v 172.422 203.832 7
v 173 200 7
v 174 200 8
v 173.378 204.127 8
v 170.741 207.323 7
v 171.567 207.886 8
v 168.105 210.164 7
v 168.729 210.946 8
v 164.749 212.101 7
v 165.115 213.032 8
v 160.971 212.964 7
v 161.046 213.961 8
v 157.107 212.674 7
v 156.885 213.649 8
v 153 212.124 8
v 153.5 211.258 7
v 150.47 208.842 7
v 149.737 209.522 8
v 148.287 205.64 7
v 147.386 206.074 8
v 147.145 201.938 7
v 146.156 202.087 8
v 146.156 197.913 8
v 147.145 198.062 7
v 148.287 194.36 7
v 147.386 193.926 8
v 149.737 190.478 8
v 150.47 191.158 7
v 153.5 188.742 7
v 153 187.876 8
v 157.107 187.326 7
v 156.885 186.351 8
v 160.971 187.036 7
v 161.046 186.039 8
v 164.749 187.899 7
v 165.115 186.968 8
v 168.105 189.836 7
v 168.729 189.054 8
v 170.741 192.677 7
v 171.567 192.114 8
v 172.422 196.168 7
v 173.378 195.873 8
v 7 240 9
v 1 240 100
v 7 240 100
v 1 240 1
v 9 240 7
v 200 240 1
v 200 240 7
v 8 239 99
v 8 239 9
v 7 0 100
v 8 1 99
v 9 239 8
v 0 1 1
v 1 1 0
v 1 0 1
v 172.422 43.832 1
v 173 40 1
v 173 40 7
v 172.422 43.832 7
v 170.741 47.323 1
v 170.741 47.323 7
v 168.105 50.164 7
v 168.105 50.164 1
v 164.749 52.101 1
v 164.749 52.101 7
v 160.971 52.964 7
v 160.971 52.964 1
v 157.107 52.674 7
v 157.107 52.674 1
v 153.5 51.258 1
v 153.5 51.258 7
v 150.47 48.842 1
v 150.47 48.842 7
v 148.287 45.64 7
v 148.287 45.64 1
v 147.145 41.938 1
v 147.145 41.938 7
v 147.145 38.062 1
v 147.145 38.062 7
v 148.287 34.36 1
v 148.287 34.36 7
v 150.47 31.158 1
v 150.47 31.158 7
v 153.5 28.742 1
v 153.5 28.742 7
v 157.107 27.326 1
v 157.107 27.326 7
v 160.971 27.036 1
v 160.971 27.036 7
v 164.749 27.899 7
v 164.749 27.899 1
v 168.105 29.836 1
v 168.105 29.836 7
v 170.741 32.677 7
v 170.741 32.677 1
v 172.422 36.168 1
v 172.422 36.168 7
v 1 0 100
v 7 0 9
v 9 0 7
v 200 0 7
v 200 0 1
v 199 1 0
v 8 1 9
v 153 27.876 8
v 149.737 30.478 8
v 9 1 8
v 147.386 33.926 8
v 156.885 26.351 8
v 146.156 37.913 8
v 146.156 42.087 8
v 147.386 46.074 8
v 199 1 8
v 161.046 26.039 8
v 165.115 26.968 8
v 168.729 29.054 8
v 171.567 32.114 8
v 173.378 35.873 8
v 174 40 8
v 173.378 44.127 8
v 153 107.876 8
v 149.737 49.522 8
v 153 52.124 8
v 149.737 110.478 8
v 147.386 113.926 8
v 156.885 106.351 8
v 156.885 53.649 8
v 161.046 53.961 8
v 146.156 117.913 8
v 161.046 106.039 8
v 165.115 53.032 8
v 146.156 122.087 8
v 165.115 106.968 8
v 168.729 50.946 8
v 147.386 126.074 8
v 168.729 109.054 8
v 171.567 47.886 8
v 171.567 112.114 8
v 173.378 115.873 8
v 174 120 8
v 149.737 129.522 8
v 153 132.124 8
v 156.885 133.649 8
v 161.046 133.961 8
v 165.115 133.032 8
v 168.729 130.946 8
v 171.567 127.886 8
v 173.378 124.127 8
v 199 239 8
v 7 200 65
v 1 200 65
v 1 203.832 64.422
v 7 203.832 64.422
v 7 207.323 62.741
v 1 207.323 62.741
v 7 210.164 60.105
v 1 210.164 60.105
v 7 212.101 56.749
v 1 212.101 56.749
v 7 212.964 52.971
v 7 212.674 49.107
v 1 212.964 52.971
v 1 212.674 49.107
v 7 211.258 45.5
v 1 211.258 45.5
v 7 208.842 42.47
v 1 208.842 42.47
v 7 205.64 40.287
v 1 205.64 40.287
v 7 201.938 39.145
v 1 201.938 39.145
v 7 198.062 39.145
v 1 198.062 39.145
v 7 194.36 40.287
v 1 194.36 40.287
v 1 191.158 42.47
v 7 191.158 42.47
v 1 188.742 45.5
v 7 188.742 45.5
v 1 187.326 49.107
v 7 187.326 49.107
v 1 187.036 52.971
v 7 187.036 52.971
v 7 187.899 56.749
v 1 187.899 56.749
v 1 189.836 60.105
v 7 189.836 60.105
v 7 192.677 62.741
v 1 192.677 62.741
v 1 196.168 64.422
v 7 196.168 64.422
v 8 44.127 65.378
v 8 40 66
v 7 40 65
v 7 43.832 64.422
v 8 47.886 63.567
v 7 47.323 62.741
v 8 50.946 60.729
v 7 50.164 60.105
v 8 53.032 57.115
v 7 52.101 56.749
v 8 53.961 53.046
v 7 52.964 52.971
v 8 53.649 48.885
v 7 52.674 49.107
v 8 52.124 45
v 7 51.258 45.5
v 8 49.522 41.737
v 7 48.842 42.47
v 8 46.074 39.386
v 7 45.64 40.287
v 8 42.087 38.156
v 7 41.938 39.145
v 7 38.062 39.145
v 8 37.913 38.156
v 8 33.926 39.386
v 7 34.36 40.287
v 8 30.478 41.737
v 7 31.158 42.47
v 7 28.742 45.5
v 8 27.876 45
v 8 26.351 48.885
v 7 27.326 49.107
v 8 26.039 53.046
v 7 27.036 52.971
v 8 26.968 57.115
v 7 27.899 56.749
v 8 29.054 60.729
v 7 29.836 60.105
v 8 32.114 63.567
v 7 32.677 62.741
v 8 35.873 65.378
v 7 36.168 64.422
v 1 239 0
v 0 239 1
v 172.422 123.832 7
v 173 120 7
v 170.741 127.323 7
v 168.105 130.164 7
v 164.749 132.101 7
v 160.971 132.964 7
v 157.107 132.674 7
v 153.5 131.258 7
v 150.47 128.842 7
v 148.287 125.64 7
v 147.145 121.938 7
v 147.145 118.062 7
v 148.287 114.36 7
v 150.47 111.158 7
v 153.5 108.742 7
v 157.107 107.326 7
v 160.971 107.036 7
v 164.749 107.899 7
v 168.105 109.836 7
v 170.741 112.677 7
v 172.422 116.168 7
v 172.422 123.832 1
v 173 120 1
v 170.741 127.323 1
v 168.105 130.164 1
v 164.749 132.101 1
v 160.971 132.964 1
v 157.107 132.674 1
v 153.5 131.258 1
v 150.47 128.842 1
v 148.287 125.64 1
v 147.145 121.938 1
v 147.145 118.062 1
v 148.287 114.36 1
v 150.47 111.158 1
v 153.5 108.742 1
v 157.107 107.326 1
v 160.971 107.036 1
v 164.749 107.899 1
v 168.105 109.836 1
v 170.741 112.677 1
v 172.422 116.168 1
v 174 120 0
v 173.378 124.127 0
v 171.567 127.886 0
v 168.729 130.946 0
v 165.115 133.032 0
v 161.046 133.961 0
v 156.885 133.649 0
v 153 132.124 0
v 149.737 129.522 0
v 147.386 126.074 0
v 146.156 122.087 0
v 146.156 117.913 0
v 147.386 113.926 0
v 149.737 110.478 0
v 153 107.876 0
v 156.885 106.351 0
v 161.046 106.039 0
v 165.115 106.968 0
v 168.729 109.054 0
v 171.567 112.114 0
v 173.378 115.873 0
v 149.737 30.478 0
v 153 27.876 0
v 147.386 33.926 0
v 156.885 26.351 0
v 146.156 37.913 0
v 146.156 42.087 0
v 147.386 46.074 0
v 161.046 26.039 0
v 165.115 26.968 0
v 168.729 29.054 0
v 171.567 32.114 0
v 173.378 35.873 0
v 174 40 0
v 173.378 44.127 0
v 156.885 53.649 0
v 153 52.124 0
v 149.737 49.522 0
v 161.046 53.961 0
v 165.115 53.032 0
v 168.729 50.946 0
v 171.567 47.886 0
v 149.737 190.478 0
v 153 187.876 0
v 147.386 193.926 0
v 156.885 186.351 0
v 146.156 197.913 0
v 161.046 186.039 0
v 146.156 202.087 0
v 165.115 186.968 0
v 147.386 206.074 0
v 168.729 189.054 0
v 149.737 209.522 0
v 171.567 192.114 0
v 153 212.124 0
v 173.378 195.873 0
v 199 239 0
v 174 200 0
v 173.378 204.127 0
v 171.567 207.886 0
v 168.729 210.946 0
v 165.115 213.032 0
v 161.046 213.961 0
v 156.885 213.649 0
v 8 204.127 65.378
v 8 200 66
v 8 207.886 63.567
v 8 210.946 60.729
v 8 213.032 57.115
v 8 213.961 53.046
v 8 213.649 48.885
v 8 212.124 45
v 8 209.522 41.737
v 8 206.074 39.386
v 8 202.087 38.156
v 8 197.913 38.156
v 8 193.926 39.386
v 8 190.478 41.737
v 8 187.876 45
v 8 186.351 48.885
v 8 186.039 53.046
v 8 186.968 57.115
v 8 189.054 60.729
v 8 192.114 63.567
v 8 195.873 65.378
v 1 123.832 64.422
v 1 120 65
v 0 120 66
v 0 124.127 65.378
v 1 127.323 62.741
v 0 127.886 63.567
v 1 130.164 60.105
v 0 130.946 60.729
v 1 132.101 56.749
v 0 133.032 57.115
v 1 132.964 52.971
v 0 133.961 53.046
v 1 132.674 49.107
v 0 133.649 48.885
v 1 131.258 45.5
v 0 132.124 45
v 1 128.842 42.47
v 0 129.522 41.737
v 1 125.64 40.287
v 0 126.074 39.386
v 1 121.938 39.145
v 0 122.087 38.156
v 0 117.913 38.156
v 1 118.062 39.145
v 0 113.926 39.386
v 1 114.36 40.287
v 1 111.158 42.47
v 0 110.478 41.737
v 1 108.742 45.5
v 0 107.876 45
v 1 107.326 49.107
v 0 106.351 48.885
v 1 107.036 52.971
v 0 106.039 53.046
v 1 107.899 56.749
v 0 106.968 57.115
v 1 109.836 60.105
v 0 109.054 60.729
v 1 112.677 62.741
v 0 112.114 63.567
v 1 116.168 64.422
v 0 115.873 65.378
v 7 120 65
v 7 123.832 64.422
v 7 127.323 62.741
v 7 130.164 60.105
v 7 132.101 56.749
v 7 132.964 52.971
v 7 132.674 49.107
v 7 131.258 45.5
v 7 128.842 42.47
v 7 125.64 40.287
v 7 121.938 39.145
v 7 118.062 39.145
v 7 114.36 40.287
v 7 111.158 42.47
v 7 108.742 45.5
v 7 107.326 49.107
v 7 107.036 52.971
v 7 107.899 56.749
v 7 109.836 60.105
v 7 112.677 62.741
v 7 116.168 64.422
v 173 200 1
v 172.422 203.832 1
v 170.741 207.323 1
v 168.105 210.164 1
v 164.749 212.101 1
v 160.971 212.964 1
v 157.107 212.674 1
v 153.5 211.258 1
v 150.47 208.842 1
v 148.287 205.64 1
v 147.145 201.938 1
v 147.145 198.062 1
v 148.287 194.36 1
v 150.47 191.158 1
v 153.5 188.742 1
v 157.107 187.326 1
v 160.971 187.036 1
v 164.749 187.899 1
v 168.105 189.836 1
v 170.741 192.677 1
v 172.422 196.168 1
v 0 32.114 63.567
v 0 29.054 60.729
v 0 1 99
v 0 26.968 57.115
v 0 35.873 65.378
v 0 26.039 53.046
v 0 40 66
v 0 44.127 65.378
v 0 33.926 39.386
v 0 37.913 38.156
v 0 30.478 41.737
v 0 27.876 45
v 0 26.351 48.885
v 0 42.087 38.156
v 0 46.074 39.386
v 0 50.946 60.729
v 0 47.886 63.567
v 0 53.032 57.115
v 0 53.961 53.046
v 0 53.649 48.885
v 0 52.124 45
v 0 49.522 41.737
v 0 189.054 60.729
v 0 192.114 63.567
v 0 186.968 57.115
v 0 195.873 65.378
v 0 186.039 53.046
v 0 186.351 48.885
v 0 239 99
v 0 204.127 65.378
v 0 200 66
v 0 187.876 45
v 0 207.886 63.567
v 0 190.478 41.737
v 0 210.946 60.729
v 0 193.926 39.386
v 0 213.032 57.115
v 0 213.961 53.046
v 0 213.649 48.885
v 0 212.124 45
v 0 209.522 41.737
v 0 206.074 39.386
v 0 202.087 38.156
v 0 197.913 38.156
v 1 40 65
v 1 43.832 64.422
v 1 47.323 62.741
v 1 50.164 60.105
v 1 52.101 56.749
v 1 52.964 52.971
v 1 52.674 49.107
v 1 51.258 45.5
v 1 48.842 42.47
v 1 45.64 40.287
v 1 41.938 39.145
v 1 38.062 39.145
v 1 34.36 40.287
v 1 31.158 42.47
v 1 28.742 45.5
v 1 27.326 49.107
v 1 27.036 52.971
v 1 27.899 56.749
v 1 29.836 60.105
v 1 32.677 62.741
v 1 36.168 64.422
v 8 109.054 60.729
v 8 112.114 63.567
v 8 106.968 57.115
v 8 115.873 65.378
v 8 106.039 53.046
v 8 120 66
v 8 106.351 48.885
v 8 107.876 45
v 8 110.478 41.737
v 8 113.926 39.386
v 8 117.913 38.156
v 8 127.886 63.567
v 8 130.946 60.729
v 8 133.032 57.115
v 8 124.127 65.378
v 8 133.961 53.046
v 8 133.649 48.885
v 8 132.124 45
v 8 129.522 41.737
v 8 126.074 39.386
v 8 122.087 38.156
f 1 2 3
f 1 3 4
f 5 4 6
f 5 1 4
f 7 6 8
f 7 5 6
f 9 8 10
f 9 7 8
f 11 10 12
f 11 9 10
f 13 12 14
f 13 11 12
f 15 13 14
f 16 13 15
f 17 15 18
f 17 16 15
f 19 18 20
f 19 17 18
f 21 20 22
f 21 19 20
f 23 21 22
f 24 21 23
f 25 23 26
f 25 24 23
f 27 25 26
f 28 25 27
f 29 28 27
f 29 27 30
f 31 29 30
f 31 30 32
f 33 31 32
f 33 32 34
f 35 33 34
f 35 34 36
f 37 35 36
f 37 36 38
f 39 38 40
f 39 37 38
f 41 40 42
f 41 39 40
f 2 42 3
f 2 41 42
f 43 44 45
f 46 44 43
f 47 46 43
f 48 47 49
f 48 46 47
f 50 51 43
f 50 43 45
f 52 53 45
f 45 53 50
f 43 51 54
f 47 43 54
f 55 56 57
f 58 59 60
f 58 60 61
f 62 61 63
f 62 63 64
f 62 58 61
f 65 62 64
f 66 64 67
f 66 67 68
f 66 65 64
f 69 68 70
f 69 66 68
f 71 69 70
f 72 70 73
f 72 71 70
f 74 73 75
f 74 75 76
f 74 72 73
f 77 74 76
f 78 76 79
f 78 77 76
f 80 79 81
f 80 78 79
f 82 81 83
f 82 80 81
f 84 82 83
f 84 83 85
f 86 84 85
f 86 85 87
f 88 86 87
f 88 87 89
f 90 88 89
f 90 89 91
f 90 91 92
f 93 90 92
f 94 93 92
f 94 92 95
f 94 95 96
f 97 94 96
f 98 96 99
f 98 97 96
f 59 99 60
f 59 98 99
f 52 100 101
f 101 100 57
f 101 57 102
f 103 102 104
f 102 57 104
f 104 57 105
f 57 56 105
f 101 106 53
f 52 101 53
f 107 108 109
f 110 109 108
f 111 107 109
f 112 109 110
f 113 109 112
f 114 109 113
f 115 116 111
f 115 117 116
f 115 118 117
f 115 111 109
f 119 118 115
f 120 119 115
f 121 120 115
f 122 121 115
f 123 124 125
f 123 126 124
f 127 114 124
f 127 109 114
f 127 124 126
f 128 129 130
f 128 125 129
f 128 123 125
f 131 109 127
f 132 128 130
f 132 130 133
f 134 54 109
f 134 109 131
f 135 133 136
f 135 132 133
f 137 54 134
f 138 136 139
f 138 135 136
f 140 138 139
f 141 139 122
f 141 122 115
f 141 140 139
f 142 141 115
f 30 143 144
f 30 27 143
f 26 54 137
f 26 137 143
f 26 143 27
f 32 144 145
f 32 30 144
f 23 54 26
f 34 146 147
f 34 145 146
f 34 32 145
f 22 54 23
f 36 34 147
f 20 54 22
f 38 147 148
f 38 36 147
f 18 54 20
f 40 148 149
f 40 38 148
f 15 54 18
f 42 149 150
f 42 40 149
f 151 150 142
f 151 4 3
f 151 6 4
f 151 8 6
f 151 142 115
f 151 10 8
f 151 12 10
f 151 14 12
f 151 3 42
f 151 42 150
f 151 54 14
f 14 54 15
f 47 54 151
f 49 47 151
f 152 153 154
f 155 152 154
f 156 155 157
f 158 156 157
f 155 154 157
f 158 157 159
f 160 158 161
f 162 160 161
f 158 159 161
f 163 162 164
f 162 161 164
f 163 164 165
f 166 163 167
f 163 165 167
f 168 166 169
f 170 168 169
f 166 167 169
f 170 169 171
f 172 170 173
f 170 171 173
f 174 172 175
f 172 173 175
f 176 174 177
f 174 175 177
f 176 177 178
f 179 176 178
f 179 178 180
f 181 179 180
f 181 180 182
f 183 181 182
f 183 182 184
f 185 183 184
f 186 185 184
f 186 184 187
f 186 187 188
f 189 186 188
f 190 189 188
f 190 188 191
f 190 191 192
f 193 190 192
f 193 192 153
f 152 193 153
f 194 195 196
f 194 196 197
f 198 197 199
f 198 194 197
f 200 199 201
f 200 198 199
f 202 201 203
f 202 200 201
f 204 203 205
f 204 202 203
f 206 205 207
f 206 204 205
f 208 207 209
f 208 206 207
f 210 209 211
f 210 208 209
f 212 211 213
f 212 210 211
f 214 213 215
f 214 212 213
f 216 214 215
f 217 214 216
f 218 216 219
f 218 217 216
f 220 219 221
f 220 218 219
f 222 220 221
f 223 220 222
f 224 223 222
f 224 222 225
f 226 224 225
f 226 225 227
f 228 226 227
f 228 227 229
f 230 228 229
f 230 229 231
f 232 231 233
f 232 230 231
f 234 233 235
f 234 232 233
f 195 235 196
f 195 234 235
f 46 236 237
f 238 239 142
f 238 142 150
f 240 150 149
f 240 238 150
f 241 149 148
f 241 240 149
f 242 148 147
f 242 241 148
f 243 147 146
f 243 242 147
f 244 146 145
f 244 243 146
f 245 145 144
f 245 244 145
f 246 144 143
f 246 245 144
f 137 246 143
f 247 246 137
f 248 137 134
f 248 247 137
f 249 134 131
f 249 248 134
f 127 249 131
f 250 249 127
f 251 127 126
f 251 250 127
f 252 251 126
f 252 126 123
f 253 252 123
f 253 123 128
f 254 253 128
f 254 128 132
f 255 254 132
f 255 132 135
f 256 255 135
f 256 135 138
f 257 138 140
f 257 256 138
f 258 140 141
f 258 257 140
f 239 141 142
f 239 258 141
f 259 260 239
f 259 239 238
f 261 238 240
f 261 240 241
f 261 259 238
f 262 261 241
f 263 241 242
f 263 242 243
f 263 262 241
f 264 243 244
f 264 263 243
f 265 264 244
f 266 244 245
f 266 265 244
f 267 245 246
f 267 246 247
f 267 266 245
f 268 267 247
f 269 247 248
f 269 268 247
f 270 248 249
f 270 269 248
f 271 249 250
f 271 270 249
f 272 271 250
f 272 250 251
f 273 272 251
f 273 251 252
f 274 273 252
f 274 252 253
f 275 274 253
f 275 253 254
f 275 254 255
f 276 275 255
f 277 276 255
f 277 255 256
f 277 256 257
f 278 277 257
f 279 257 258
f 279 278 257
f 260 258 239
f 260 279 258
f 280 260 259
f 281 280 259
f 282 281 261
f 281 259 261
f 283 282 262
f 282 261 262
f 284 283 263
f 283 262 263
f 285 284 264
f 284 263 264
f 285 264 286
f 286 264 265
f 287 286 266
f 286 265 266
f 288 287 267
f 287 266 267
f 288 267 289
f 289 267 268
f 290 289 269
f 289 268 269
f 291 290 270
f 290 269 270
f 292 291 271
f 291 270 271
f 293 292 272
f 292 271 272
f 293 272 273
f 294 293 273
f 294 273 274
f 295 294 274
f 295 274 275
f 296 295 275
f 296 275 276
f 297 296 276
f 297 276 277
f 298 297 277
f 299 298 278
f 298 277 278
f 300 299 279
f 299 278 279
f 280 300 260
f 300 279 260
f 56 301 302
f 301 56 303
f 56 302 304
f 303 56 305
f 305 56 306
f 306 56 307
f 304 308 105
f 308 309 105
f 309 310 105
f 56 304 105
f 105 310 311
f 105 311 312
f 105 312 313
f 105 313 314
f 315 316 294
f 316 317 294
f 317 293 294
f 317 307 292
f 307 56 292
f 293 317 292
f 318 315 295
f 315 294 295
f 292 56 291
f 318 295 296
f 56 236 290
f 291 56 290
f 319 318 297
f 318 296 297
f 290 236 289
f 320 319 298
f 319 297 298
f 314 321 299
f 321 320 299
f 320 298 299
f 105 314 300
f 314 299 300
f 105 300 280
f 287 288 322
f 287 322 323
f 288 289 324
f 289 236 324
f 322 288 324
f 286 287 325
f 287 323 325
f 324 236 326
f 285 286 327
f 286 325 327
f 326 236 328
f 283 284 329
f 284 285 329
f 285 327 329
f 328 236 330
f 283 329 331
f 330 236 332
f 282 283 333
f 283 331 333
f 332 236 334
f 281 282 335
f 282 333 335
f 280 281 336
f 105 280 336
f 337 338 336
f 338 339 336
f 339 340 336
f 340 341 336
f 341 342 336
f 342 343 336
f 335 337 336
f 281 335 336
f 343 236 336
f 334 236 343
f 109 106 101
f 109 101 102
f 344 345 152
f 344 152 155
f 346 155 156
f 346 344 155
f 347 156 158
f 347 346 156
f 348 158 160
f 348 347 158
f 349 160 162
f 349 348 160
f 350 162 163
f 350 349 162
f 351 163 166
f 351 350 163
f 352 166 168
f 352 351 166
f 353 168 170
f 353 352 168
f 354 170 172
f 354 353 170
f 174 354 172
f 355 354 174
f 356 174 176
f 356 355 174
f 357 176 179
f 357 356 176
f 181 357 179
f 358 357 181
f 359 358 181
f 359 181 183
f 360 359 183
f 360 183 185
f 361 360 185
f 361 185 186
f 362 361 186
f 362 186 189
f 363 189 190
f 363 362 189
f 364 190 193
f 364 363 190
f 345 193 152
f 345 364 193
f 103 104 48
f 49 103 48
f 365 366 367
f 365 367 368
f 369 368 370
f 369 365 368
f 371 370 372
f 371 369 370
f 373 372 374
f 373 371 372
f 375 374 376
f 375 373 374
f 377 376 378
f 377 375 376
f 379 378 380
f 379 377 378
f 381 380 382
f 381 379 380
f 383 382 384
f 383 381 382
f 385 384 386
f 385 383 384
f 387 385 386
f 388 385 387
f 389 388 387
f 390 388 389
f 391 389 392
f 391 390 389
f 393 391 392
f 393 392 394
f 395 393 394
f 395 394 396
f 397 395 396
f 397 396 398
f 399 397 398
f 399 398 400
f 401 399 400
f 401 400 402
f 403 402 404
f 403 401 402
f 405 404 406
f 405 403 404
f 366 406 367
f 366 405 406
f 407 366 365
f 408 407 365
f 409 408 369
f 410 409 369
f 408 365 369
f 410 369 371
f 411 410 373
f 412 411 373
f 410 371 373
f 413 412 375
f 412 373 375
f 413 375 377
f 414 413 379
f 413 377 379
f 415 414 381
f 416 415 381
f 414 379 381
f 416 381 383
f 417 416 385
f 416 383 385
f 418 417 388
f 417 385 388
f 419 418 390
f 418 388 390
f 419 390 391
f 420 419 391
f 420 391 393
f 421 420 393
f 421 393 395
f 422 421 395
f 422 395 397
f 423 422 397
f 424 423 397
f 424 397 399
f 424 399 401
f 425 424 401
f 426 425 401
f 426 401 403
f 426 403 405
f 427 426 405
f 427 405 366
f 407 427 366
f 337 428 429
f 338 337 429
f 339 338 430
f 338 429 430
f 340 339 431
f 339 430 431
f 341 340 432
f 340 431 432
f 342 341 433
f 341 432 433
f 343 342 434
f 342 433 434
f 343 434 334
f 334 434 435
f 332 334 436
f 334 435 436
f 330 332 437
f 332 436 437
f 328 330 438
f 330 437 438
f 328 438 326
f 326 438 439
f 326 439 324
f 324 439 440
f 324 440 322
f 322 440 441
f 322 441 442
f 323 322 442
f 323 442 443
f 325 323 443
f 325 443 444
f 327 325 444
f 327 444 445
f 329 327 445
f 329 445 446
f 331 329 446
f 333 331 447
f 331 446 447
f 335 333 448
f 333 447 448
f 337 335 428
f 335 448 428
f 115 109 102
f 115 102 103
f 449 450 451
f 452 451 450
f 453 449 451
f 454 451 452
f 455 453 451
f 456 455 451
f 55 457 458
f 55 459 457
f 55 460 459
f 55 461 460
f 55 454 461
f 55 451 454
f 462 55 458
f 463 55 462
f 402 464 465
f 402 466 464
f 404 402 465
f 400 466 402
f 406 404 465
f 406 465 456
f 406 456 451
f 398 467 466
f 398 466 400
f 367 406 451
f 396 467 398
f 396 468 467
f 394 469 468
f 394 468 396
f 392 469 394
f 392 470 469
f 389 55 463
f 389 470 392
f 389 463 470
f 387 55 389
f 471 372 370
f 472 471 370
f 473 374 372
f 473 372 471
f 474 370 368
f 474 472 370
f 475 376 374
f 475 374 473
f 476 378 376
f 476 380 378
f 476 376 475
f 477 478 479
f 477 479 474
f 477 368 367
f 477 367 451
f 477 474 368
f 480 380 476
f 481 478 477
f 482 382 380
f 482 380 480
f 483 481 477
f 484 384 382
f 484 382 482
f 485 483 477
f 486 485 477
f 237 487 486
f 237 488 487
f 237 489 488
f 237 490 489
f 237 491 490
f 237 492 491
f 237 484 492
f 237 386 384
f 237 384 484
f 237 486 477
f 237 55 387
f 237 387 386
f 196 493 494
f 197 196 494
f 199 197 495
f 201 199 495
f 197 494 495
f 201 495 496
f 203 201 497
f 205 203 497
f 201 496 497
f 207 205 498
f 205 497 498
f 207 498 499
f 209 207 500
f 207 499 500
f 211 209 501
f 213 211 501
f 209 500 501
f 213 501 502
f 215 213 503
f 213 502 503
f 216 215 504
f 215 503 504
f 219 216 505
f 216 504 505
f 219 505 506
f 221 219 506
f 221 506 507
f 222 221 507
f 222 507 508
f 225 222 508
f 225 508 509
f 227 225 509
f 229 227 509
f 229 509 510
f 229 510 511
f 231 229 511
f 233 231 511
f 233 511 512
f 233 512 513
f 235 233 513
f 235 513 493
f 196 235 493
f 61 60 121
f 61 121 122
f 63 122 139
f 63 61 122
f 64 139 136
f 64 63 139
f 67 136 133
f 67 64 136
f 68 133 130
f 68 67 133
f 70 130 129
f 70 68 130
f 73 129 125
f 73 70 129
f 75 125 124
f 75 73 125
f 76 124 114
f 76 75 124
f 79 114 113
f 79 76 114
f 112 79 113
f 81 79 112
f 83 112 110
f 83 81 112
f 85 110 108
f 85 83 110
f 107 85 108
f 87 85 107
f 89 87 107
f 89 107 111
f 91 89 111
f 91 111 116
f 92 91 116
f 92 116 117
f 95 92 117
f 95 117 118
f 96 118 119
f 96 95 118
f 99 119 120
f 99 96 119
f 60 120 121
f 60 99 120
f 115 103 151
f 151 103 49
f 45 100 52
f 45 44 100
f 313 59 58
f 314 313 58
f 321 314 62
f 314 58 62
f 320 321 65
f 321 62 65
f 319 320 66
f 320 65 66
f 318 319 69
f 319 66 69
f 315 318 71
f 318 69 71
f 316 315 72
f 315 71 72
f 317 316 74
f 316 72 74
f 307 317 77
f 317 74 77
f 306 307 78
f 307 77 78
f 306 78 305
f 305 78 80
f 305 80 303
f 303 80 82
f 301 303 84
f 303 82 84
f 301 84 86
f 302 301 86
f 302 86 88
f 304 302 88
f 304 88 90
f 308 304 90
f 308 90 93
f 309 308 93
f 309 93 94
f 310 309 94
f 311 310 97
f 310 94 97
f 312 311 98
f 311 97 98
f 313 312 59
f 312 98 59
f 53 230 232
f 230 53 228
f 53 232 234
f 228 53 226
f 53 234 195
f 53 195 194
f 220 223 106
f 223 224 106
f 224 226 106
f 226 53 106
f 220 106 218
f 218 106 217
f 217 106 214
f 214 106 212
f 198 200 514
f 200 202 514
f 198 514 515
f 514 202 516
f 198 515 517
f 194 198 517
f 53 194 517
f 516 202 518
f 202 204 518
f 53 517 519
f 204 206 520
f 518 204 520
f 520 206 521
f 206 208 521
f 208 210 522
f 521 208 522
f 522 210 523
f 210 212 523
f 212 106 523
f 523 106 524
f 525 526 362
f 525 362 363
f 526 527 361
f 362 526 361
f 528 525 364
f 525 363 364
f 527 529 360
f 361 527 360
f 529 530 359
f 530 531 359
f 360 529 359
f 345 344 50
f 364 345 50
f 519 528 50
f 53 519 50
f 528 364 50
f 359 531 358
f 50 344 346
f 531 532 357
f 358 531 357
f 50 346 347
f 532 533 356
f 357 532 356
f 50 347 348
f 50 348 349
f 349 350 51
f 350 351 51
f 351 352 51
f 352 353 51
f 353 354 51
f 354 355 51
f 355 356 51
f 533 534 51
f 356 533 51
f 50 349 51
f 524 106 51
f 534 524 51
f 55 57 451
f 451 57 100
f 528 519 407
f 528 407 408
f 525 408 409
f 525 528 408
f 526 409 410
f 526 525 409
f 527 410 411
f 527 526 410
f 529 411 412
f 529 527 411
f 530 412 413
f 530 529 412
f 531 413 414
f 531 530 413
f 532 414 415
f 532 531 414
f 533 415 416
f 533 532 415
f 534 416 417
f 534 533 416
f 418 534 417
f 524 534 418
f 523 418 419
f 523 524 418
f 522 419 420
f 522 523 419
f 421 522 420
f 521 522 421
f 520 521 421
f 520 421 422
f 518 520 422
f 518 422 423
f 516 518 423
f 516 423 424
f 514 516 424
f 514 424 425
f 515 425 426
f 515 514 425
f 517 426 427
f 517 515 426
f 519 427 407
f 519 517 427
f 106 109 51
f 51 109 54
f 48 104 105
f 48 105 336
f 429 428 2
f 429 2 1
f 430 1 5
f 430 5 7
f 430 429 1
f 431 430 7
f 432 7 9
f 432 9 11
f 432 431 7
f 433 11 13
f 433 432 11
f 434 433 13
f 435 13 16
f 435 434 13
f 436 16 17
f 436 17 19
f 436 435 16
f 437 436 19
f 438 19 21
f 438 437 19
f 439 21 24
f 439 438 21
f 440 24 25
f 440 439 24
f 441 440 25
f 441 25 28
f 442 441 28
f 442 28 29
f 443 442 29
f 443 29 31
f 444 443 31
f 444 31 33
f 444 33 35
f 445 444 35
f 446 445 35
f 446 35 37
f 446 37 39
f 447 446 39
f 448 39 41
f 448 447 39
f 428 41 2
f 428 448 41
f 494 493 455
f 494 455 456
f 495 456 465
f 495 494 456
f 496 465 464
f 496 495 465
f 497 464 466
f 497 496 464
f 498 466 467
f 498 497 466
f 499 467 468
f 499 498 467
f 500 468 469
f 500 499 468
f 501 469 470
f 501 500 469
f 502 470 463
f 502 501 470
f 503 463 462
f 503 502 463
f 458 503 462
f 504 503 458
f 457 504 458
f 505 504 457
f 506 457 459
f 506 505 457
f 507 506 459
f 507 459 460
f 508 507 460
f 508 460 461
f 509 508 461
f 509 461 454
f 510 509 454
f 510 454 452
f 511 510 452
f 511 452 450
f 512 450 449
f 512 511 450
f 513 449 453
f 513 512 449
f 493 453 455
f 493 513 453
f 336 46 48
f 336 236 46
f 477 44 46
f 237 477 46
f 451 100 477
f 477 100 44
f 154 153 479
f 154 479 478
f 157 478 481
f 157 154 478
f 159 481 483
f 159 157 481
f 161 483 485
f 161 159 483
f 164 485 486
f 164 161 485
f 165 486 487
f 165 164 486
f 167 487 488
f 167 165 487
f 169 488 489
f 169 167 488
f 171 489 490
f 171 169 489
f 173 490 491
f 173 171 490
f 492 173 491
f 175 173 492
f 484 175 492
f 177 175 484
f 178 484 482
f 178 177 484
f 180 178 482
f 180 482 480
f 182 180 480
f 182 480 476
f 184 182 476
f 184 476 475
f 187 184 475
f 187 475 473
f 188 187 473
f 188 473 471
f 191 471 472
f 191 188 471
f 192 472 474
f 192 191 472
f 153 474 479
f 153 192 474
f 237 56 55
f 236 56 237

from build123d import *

# Parameters (mm, degrees)
SKETCH_1_W          = 200
SKETCH_1_H          = 240
SKETCH_1_R          = 13
EXTRUDE_323_DEPTH   = 8
SKETCH_2_W          = 8
SKETCH_2_H          = 240
EXTRUDE_1_DEPTH     = 92
SKETCH_3_R          = 13
CUT_EXTRUDE_1_DEPTH = 329.024389337
CHAMFER_1_SIZE      = 1


with BuildPart() as part:
    # 草图1 → Extrude 323 (new body)
    with BuildSketch(Plane.XY):
        with Locations((100, 120)):
            Rectangle(SKETCH_1_W, SKETCH_1_H)
        with Locations((160, 40)):
            Circle(SKETCH_1_R, mode=Mode.SUBTRACT)
        with Locations((160, 120)):
            Circle(SKETCH_1_R, mode=Mode.SUBTRACT)
        with Locations((160, 200)):
            Circle(SKETCH_1_R, mode=Mode.SUBTRACT)
    extrude(amount=EXTRUDE_323_DEPTH)

    # 草图2 → 凸台-拉伸1 (add)
    with BuildSketch(Plane.XY.offset(8)):
        with Locations((4, 120)):
            Rectangle(SKETCH_2_W, SKETCH_2_H)
    extrude(amount=EXTRUDE_1_DEPTH)

    # 草图3 → 切除-拉伸1 (cut, through all)
    with BuildSketch(Plane.ZY):
        with Locations((52, 200)):
            Circle(SKETCH_3_R)
        with Locations((52, 120)):
            Circle(SKETCH_3_R)
        with Locations((52, 40)):
            Circle(SKETCH_3_R)
    extrude(amount=-CUT_EXTRUDE_1_DEPTH, mode=Mode.SUBTRACT)

    # 倒角1
    chamfer_1_edges = [part.edges().sort_by_distance(p)[0] for p in [
        (200, 120, 8),
        (147, 40, 0),
        (147, 40, 8),
        (104, 240, 8),
        (147, 120, 0),
        (147, 120, 8),
        (147, 200, 0),
        (147, 200, 8),
        (104, 0, 8),
        (8, 120, 8),
        (8, 0, 54),
        (8, 240, 54),
        (0, 120, 100),
        (8, 120, 100),
        (8, 200, 39),
        (0, 200, 39),
        (100, 240, 0),
        (8, 120, 39),
        (0, 120, 39),
        (8, 40, 39),
        (0, 40, 39),
        (200, 120, 0),
        (100, 0, 0),
        (0, 120, 0),
        (0, 240, 50),
        (0, 0, 50),
    ]]
    chamfer(chamfer_1_edges, length=CHAMFER_1_SIZE)


solid = part.part
